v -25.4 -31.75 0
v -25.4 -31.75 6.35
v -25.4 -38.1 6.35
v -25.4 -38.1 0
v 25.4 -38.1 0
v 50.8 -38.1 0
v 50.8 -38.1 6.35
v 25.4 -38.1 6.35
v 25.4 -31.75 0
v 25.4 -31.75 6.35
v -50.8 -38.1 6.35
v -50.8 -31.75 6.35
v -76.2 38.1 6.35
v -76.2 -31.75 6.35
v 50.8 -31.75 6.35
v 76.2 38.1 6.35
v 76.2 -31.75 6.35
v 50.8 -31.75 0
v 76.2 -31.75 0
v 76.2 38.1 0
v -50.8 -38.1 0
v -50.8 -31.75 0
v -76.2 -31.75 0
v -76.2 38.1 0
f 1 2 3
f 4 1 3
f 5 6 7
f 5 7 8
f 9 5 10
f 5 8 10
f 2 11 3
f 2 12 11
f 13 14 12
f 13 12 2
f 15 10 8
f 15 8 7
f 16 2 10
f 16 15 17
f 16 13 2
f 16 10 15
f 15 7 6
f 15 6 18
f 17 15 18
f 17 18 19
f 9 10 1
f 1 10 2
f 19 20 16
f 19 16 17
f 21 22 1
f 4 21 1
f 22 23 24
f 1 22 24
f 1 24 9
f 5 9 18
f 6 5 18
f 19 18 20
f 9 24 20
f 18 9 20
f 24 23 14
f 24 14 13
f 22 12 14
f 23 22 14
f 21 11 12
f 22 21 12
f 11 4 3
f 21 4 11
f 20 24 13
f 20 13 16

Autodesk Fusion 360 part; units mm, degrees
sketch "Sketch1" plane through (0, 0, 0) normal (0, 0, 1) x (1, 0, 0)
  line L0 (-76.2, 38.1) -> (76.2, 38.1)
  line L1 (76.2, 38.1) -> (76.2, -38.1)
  line L2 (76.2, -38.1) -> (-76.2, -38.1)
  line L3 (-76.2, -38.1) -> (-76.2, 38.1)
  dimension "d1" = 152.4
  dimension "d2" = 76.2
  dimension "d3" = 76.2
  dimension "d4" = 38.1
extrude "Extrude1" add sketch "Sketch1" along normal blind 6.35
sketch "Sketch2" plane through (0, 0, 6.35) normal (0, 0, 1) x (-1, 0, 0)
  line L0 (76.2, 38.1) -> (-76.2, 38.1)
  line L1 (-76.2, 38.1) -> (-76.2, -38.1)
  line L2 (-76.2, -38.1) -> (76.2, -38.1)
  line L3 (76.2, -38.1) -> (76.2, 38.1)
  line L4 (76.2, 38.1) -> (50.8, 38.1)
  line L5 (50.8, 38.1) -> (50.8, 31.75)
  line L6 (50.8, 31.75) -> (76.2, 31.75)
  line L7 (76.2, 31.75) -> (76.2, 38.1)
  line L8 (-76.2, 38.1) -> (-50.8, 38.1)
  line L9 (-50.8, 38.1) -> (-50.8, 31.75)
  line L10 (-50.8, 31.75) -> (-76.2, 31.75)
  line L11 (-76.2, 31.75) -> (-76.2, 38.1)
  line L12 (25.4, 38.1) -> (-25.4, 38.1)
  line L13 (-25.4, 38.1) -> (-25.4, 31.75)
  line L14 (-25.4, 31.75) -> (25.4, 31.75)
  line L15 (25.4, 31.75) -> (25.4, 38.1)
  dimension "d7" = 25.4
  dimension "d8" = 6.35
  dimension "d9" = 25.4
  dimension "d10" = 6.35
  dimension "d11" = 25.4
  dimension "d12" = 25.4
  dimension "d13" = 6.35
extrude "Extrude2" cut sketch "Sketch2" against normal through all contours L0 L3 L4 L5 L6 L7 | L0 L12 L13 L14 L15 | L0 L1 L8 L9 L10 L11
